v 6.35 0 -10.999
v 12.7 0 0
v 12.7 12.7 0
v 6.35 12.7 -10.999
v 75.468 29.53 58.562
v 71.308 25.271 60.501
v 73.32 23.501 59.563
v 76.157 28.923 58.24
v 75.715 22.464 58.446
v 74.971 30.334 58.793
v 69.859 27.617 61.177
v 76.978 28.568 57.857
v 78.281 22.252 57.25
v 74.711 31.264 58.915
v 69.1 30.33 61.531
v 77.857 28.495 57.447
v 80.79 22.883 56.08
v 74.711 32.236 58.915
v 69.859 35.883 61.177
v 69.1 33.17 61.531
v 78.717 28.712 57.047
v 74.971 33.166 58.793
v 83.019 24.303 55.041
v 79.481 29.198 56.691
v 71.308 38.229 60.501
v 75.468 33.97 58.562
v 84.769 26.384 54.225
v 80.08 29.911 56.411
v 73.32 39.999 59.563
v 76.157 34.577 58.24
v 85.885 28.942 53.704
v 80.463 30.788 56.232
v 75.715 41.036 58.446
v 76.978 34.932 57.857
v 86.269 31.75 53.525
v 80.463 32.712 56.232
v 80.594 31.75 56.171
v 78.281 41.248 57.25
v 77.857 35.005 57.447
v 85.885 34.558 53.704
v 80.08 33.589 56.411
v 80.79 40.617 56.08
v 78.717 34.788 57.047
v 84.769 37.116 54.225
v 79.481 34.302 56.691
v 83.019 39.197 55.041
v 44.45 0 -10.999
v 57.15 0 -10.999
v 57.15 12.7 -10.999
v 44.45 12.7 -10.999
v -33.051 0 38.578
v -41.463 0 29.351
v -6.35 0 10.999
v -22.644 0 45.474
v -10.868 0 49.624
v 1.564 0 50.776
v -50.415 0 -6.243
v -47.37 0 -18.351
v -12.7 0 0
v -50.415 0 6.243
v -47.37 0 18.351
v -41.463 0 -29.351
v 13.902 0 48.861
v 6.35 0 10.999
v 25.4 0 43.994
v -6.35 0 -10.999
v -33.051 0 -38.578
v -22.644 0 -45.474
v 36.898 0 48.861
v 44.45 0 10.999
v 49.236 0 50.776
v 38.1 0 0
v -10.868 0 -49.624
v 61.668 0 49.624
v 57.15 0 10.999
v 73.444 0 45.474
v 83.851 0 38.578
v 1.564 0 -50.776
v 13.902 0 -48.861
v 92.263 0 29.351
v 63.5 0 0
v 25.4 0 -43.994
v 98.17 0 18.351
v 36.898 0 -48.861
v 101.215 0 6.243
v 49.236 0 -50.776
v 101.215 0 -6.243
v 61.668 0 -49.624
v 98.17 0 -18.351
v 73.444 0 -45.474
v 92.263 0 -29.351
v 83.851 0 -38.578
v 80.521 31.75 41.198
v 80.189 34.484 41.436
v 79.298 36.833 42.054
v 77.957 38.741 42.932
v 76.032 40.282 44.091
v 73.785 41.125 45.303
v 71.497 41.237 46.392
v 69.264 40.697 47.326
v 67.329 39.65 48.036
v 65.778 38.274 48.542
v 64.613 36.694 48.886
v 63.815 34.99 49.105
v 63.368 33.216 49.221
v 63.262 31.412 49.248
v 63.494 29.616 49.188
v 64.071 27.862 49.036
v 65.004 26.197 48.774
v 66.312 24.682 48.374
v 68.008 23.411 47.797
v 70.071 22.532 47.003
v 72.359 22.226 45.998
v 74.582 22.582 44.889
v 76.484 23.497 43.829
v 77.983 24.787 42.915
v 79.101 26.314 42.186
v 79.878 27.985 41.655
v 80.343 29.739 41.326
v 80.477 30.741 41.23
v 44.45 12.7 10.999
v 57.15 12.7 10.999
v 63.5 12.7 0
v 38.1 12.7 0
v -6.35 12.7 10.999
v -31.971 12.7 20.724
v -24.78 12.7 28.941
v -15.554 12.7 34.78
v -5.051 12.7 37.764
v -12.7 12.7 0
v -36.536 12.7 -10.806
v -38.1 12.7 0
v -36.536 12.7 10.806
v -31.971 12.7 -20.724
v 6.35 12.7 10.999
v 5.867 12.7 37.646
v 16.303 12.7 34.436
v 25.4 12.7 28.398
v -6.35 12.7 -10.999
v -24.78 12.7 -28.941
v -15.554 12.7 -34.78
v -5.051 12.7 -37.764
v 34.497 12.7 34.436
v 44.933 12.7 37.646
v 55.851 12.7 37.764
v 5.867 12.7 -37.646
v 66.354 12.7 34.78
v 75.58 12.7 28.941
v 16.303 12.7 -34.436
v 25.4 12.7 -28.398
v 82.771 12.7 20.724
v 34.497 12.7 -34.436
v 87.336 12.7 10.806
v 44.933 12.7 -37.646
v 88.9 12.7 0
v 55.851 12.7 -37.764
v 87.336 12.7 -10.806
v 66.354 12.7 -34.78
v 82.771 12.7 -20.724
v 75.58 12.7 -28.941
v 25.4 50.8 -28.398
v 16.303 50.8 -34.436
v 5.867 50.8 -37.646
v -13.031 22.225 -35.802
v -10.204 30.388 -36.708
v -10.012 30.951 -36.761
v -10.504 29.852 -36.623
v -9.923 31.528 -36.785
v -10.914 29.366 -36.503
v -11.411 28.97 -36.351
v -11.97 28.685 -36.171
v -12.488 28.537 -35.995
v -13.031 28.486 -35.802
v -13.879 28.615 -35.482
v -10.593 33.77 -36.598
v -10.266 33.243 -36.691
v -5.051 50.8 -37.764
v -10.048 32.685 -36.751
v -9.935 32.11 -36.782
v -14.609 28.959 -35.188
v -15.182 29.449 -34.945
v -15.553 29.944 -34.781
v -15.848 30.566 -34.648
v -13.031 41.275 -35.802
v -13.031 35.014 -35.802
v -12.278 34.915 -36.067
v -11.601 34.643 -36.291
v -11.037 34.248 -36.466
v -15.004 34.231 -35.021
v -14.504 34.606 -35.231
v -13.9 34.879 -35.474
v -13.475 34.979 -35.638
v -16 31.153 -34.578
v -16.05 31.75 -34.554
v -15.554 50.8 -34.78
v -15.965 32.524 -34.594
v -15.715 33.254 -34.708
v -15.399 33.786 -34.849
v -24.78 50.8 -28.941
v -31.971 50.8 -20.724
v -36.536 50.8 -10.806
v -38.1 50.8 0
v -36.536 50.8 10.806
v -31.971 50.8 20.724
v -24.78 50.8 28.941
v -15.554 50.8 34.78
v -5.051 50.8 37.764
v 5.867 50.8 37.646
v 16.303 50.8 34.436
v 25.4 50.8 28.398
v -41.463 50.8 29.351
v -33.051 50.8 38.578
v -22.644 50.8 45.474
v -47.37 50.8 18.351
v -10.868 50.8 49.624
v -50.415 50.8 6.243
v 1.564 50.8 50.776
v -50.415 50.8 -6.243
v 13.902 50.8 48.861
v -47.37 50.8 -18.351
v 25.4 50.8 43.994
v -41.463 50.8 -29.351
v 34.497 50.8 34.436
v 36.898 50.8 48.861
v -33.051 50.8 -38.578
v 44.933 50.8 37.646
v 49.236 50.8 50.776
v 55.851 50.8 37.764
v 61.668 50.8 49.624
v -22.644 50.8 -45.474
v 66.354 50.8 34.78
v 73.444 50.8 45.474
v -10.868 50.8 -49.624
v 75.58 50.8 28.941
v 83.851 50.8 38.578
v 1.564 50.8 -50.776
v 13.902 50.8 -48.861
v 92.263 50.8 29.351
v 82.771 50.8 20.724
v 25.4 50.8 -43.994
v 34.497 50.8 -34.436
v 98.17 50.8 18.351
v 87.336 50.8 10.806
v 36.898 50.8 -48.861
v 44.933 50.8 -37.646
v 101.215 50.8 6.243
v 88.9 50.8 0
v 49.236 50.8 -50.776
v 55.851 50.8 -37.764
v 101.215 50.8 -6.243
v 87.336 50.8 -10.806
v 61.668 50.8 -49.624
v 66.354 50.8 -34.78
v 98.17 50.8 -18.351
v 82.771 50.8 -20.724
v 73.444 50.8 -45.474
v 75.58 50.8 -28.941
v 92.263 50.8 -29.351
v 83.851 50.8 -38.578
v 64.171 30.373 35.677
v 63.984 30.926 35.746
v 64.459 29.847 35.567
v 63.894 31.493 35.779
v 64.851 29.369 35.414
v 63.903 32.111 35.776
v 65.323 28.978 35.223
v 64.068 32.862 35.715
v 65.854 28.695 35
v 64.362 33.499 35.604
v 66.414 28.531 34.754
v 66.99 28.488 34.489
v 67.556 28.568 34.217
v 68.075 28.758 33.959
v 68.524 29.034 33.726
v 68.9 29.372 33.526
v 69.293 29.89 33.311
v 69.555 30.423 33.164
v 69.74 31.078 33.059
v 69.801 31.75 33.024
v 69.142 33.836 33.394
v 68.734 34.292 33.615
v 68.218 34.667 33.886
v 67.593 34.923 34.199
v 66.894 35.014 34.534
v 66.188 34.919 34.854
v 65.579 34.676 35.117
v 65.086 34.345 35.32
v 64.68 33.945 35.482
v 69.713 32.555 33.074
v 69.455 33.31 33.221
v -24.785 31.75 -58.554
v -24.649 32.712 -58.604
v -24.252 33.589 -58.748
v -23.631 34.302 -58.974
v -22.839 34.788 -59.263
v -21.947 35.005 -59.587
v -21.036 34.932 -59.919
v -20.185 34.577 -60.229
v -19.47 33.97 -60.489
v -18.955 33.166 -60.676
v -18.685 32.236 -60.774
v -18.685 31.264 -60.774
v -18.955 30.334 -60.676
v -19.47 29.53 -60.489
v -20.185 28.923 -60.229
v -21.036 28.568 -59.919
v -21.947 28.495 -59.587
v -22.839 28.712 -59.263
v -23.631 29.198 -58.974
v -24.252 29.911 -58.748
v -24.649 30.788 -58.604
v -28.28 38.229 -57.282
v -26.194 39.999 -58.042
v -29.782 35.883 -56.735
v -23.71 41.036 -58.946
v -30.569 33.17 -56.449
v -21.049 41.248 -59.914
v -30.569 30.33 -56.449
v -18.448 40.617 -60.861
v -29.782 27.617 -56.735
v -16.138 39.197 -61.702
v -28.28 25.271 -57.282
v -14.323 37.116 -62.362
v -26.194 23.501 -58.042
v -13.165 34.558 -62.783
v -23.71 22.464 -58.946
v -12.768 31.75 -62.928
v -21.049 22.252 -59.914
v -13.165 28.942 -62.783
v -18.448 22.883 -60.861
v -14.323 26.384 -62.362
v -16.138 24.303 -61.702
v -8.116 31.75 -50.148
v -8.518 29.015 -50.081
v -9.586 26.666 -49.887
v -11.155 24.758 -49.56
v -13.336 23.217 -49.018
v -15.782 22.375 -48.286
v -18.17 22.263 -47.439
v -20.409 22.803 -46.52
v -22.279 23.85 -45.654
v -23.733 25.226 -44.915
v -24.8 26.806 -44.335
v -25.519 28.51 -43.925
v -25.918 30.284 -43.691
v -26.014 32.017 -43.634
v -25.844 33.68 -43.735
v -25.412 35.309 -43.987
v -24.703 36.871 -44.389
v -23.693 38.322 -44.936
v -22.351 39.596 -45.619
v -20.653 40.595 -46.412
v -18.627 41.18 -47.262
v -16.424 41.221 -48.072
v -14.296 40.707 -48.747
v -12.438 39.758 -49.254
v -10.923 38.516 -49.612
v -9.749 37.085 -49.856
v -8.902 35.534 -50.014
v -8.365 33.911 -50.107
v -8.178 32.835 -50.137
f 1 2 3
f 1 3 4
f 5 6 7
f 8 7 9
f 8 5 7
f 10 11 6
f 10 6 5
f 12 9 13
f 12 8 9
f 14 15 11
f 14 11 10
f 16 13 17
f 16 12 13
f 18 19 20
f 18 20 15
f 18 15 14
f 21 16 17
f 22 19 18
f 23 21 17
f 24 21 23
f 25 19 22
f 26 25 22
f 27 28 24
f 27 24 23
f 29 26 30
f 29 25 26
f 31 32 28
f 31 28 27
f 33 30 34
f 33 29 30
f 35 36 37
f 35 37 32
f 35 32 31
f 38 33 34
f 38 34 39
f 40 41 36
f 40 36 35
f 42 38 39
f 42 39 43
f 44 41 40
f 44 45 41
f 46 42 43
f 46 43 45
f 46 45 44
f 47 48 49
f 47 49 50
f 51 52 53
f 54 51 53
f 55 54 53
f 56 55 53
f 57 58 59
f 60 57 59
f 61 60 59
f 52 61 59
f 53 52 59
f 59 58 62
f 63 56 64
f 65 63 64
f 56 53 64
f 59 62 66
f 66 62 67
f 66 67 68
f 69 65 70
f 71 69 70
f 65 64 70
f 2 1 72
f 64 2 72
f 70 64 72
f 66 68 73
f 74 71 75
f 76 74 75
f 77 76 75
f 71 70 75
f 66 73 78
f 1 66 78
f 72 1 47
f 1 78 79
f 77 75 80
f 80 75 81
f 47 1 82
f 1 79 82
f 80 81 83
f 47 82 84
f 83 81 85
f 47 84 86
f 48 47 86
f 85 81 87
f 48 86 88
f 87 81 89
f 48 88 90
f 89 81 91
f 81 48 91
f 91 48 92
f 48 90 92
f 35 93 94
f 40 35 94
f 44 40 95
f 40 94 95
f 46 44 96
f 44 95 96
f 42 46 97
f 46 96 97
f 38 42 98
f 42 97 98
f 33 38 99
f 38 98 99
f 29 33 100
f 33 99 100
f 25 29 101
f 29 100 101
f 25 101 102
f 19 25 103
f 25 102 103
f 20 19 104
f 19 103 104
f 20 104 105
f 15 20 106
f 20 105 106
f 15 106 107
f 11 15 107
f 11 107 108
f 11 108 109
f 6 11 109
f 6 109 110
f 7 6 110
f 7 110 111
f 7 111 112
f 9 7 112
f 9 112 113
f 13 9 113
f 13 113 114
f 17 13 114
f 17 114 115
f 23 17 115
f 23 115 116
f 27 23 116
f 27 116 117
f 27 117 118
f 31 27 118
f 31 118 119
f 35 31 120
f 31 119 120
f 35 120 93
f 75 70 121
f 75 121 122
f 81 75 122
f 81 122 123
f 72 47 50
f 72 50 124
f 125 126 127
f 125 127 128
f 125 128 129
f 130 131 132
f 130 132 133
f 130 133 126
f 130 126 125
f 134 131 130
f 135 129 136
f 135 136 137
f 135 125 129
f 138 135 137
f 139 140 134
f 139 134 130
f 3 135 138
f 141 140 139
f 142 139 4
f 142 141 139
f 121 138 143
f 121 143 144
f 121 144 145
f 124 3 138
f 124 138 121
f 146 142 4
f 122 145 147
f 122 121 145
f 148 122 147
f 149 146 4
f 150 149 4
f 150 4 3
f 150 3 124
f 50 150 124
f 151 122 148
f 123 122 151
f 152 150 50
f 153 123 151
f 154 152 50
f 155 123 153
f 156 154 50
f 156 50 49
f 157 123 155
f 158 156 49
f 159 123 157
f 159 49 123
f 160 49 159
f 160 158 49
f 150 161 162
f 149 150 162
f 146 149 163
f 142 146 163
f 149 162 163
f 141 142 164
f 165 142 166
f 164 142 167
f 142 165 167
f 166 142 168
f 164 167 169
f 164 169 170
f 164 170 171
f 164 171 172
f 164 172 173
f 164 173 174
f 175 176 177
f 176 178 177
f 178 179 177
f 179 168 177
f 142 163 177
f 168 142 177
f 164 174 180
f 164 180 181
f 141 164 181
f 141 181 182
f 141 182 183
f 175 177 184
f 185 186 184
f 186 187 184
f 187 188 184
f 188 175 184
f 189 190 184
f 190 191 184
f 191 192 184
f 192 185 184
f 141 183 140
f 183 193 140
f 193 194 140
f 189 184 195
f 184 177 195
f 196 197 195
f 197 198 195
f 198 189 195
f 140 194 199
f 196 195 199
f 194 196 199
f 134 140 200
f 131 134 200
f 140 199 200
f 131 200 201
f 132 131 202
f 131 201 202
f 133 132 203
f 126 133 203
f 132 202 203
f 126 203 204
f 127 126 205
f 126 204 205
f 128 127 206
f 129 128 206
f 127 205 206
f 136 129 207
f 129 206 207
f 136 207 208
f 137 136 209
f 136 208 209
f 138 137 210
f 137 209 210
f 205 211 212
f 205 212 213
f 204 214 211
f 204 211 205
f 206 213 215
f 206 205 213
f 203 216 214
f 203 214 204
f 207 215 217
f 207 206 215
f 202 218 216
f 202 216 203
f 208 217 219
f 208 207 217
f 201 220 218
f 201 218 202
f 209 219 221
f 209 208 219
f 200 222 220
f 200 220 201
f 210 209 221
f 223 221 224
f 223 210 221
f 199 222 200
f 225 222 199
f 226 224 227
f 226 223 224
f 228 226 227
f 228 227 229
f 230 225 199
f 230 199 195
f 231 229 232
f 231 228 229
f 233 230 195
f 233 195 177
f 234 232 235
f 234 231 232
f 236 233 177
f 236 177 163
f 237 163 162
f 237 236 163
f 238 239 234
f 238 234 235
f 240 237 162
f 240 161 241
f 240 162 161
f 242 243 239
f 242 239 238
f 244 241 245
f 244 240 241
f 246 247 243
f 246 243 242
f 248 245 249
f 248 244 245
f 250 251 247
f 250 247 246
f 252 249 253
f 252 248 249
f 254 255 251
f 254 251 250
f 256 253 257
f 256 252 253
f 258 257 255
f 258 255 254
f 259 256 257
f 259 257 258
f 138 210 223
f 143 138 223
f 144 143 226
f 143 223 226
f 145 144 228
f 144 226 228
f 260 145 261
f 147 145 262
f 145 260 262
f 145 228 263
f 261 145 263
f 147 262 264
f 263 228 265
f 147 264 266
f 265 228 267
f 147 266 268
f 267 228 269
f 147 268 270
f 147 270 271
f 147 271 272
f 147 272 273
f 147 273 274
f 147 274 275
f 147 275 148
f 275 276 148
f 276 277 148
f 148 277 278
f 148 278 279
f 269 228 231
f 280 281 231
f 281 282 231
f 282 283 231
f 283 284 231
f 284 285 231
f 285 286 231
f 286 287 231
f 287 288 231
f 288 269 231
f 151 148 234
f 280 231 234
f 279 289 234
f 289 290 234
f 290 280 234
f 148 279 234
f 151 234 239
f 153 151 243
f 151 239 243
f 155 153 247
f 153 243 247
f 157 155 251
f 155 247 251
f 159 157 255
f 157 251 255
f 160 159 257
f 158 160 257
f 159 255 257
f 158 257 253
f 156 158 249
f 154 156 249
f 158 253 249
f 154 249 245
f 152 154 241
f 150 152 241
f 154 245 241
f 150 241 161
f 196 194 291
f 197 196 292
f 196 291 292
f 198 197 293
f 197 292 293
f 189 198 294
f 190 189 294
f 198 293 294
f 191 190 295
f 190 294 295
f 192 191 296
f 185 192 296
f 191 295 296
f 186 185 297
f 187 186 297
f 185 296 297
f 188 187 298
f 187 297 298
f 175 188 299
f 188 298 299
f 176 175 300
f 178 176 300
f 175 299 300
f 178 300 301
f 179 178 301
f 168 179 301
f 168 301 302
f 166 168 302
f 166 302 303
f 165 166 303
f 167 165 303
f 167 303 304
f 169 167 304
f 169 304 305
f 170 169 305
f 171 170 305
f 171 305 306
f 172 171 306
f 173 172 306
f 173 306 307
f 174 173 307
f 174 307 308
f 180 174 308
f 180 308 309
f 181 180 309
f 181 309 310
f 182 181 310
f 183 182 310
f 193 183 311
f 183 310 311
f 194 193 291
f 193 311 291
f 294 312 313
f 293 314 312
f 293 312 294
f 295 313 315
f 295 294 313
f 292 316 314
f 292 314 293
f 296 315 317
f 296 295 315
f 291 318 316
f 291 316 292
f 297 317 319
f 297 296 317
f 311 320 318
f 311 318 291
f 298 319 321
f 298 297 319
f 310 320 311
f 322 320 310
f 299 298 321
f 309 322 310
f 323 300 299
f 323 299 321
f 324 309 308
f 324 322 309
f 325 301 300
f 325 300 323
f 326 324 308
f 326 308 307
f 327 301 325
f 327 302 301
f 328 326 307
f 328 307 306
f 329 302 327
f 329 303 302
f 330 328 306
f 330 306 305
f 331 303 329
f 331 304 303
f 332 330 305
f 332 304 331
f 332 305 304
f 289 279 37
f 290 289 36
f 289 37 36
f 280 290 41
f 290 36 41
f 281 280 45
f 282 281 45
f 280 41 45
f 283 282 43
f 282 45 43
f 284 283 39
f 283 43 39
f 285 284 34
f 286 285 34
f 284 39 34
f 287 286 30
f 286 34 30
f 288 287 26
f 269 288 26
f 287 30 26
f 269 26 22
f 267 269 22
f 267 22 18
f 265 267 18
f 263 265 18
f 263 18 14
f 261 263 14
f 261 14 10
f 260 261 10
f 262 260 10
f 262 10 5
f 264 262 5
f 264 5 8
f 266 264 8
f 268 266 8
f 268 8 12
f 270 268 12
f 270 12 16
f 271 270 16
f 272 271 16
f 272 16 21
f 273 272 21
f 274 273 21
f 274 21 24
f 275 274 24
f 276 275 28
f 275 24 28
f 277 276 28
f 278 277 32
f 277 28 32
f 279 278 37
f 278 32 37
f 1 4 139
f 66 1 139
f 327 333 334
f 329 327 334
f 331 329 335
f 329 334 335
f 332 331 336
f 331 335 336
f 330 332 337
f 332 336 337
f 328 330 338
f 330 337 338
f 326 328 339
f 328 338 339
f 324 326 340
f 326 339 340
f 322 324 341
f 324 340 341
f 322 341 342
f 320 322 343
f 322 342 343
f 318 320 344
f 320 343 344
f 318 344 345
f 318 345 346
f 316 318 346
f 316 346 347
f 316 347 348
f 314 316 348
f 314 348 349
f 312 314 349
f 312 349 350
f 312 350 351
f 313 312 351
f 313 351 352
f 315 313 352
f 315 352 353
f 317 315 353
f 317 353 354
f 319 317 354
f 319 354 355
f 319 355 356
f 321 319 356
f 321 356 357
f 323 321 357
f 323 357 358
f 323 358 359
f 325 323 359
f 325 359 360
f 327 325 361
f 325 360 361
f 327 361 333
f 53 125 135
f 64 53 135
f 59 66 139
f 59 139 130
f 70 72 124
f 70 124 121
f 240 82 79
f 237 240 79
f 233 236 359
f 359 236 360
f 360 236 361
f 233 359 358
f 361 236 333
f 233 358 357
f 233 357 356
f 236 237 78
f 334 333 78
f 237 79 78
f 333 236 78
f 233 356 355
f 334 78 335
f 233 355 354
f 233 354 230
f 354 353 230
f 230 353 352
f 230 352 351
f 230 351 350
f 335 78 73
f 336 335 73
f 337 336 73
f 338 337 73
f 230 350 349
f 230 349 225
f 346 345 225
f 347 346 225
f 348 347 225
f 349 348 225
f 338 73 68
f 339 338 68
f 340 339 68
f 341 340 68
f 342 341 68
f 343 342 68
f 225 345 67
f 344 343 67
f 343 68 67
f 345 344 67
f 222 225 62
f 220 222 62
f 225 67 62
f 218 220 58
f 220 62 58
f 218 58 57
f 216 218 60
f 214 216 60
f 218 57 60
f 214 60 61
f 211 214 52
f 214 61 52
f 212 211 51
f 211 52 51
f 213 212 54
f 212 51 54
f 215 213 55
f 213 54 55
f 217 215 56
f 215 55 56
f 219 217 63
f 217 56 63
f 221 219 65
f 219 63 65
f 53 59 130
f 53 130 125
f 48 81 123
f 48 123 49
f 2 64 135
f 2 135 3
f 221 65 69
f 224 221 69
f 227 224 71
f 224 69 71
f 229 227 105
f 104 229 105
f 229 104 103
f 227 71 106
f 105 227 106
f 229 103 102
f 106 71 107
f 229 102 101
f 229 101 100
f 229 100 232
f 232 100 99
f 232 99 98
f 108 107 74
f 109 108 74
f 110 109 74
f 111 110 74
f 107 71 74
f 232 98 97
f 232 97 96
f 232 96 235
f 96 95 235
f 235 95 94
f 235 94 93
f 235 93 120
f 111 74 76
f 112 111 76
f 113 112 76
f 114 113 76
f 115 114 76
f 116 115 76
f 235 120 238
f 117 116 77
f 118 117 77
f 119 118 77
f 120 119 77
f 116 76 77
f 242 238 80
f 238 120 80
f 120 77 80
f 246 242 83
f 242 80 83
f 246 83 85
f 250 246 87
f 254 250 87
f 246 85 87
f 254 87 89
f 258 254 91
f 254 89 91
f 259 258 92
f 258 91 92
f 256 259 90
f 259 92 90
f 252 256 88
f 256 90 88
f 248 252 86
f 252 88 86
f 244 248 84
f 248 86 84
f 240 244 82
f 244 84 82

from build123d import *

# Parameters (mm, degrees)
BOSS_EXTRUDE1_DEPTH           = 50.8
CUT_EXTRUDE1_DEPTH            = 38.1
CUT_EXTRUDE2_DEPTH            = 38.1
BOSS_EXTRUDE3_DEPTH           = 12.7
BOSS_EXTRUDE3_DEPTH_BACK      = 12.7
SKETCH16_R                    = 9.525
F_5_16_18_TAPPED_HOLE4_REACH  = 170.58
F_5_16_18_TAPPED_HOLE4_BORE_R = 3.2639
BOSS_EXTRUDE6_DEPTH           = 12.7
BOSS_EXTRUDE6_DEPTH_BACK      = 5.08
SKETCH20_R                    = 9.525
F_5_16_18_TAPPED_HOLE5_REACH  = 180.939
F_5_16_18_TAPPED_HOLE5_BORE_R = 3.2639


with BuildPart() as part:
    # Sketch1 → Boss-Extrude1 (new body)
    with BuildSketch(Plane(origin=(0, 0, 0), x_dir=(1, 0, 0), z_dir=(0, 1, 0))):
        with BuildLine():
            ThreePointArc((25.4, 43.994090512), (-50.8, 0), (25.4, -43.994090512))
            ThreePointArc((25.4, -43.994090512), (101.6, 0), (25.4, 43.994090512))
        make_face()
    extrude(amount=BOSS_EXTRUDE1_DEPTH)

    # Sketch3 → Cut-Extrude1 (cut)
    with BuildSketch(Plane(origin=(0, 50.8, 0), x_dir=(1, 0, 0), z_dir=(0, 1, 0))):
        with BuildLine():
            ThreePointArc((25.4, -28.398063314), (88.9, 0), (25.4, 28.398063314))
            ThreePointArc((25.4, 28.398063314), (-38.1, 0), (25.4, -28.398063314))
        make_face()
    extrude(amount=-CUT_EXTRUDE1_DEPTH, mode=Mode.SUBTRACT)

    # Sketch5 → Cut-Extrude2 (cut)
    with BuildSketch(Plane(origin=(0, 12.7, 0), x_dir=(1, 0, 0), z_dir=(0, 1, 0))):
        Polygon((63.5, 0), (57.15, 10.998522628), (44.45, 10.998522628), (38.1, 0), (44.45, -10.998522628), (57.15, -10.998522628), align=None)
        Polygon((12.7, 0), (6.35, 10.998522628), (-6.35, 10.998522628), (-12.7, 0), (-6.35, -10.998522628), (6.35, -10.998522628), align=None)
    extrude(amount=-CUT_EXTRUDE2_DEPTH, mode=Mode.SUBTRACT)

    # Sketch16 → Boss-Extrude3 (add, two sides: drawn at the far end of the back side and taken through both)
    with BuildSketch(Plane(origin=(-17.374623281, 0, -47.736385136), x_dir=(0, -1, 0), z_dir=(-0.34202014332566666, 0, -0.9396926207859091)).offset(-BOSS_EXTRUDE3_DEPTH_BACK)):
        with Locations(Location((-31.75, 0, 0), (0, 0, 270))):
            Circle(SKETCH16_R)
    extrude(amount=BOSS_EXTRUDE3_DEPTH + BOSS_EXTRUDE3_DEPTH_BACK)

    # 5/16-18 Tapped Hole4 bore (on position points) → 5/16-18 Tapped Hole4 (cut, up to next)
    with BuildSketch(Plane(origin=(-21.718279101, 31.75, -59.67048142), x_dir=(-0.939692620786, 0, 0.342020143326), z_dir=(-0.342020143326, 0, -0.939692620786)), mode=Mode.PRIVATE) as f_5_16_18_tapped_hole4_sk1:
        Circle(F_5_16_18_TAPPED_HOLE4_BORE_R)
    f_5_16_18_tapped_hole4_tool1 = extrude(f_5_16_18_tapped_hole4_sk1.sketch, amount=-F_5_16_18_TAPPED_HOLE4_REACH, mode=Mode.PRIVATE) & part.part
    add(f_5_16_18_tapped_hole4_tool1.solids().sort_by_distance((-21.718279, 31.75, -59.670481))[0], mode=Mode.SUBTRACT)

    # Sketch20 → Boss-Extrude6 (add, two sides: drawn at the far end of the back side and taken through both)
    with BuildSketch(Plane(origin=(30.54220241, 0, 65.497964437), x_dir=(0, -1, 0), z_dir=(0.42261826174068773, 0, 0.9063077870366555)).offset(-BOSS_EXTRUDE6_DEPTH_BACK)):
        with Locations(Location((-31.75, 46.040435581, 0), (0, 0, 90))):
            Circle(SKETCH20_R)
    extrude(amount=BOSS_EXTRUDE6_DEPTH + BOSS_EXTRUDE6_DEPTH_BACK)

    # 5/16-18 Tapped Hole5 bore (on position points) → 5/16-18 Tapped Hole5 (cut, up to next)
    with BuildSketch(Plane(origin=(77.636259621, 31.75, 57.550544477), x_dir=(0.906307787037, 0, -0.422618261741), z_dir=(0.422618261741, 0, 0.906307787037)), mode=Mode.PRIVATE) as f_5_16_18_tapped_hole5_sk1:
        Circle(F_5_16_18_TAPPED_HOLE5_BORE_R)
    f_5_16_18_tapped_hole5_tool1 = extrude(f_5_16_18_tapped_hole5_sk1.sketch, amount=-F_5_16_18_TAPPED_HOLE5_REACH, mode=Mode.PRIVATE) & part.part
    add(f_5_16_18_tapped_hole5_tool1.solids().sort_by_distance((77.63626, 31.75, 57.550544))[0], mode=Mode.SUBTRACT)


solid = part.part
